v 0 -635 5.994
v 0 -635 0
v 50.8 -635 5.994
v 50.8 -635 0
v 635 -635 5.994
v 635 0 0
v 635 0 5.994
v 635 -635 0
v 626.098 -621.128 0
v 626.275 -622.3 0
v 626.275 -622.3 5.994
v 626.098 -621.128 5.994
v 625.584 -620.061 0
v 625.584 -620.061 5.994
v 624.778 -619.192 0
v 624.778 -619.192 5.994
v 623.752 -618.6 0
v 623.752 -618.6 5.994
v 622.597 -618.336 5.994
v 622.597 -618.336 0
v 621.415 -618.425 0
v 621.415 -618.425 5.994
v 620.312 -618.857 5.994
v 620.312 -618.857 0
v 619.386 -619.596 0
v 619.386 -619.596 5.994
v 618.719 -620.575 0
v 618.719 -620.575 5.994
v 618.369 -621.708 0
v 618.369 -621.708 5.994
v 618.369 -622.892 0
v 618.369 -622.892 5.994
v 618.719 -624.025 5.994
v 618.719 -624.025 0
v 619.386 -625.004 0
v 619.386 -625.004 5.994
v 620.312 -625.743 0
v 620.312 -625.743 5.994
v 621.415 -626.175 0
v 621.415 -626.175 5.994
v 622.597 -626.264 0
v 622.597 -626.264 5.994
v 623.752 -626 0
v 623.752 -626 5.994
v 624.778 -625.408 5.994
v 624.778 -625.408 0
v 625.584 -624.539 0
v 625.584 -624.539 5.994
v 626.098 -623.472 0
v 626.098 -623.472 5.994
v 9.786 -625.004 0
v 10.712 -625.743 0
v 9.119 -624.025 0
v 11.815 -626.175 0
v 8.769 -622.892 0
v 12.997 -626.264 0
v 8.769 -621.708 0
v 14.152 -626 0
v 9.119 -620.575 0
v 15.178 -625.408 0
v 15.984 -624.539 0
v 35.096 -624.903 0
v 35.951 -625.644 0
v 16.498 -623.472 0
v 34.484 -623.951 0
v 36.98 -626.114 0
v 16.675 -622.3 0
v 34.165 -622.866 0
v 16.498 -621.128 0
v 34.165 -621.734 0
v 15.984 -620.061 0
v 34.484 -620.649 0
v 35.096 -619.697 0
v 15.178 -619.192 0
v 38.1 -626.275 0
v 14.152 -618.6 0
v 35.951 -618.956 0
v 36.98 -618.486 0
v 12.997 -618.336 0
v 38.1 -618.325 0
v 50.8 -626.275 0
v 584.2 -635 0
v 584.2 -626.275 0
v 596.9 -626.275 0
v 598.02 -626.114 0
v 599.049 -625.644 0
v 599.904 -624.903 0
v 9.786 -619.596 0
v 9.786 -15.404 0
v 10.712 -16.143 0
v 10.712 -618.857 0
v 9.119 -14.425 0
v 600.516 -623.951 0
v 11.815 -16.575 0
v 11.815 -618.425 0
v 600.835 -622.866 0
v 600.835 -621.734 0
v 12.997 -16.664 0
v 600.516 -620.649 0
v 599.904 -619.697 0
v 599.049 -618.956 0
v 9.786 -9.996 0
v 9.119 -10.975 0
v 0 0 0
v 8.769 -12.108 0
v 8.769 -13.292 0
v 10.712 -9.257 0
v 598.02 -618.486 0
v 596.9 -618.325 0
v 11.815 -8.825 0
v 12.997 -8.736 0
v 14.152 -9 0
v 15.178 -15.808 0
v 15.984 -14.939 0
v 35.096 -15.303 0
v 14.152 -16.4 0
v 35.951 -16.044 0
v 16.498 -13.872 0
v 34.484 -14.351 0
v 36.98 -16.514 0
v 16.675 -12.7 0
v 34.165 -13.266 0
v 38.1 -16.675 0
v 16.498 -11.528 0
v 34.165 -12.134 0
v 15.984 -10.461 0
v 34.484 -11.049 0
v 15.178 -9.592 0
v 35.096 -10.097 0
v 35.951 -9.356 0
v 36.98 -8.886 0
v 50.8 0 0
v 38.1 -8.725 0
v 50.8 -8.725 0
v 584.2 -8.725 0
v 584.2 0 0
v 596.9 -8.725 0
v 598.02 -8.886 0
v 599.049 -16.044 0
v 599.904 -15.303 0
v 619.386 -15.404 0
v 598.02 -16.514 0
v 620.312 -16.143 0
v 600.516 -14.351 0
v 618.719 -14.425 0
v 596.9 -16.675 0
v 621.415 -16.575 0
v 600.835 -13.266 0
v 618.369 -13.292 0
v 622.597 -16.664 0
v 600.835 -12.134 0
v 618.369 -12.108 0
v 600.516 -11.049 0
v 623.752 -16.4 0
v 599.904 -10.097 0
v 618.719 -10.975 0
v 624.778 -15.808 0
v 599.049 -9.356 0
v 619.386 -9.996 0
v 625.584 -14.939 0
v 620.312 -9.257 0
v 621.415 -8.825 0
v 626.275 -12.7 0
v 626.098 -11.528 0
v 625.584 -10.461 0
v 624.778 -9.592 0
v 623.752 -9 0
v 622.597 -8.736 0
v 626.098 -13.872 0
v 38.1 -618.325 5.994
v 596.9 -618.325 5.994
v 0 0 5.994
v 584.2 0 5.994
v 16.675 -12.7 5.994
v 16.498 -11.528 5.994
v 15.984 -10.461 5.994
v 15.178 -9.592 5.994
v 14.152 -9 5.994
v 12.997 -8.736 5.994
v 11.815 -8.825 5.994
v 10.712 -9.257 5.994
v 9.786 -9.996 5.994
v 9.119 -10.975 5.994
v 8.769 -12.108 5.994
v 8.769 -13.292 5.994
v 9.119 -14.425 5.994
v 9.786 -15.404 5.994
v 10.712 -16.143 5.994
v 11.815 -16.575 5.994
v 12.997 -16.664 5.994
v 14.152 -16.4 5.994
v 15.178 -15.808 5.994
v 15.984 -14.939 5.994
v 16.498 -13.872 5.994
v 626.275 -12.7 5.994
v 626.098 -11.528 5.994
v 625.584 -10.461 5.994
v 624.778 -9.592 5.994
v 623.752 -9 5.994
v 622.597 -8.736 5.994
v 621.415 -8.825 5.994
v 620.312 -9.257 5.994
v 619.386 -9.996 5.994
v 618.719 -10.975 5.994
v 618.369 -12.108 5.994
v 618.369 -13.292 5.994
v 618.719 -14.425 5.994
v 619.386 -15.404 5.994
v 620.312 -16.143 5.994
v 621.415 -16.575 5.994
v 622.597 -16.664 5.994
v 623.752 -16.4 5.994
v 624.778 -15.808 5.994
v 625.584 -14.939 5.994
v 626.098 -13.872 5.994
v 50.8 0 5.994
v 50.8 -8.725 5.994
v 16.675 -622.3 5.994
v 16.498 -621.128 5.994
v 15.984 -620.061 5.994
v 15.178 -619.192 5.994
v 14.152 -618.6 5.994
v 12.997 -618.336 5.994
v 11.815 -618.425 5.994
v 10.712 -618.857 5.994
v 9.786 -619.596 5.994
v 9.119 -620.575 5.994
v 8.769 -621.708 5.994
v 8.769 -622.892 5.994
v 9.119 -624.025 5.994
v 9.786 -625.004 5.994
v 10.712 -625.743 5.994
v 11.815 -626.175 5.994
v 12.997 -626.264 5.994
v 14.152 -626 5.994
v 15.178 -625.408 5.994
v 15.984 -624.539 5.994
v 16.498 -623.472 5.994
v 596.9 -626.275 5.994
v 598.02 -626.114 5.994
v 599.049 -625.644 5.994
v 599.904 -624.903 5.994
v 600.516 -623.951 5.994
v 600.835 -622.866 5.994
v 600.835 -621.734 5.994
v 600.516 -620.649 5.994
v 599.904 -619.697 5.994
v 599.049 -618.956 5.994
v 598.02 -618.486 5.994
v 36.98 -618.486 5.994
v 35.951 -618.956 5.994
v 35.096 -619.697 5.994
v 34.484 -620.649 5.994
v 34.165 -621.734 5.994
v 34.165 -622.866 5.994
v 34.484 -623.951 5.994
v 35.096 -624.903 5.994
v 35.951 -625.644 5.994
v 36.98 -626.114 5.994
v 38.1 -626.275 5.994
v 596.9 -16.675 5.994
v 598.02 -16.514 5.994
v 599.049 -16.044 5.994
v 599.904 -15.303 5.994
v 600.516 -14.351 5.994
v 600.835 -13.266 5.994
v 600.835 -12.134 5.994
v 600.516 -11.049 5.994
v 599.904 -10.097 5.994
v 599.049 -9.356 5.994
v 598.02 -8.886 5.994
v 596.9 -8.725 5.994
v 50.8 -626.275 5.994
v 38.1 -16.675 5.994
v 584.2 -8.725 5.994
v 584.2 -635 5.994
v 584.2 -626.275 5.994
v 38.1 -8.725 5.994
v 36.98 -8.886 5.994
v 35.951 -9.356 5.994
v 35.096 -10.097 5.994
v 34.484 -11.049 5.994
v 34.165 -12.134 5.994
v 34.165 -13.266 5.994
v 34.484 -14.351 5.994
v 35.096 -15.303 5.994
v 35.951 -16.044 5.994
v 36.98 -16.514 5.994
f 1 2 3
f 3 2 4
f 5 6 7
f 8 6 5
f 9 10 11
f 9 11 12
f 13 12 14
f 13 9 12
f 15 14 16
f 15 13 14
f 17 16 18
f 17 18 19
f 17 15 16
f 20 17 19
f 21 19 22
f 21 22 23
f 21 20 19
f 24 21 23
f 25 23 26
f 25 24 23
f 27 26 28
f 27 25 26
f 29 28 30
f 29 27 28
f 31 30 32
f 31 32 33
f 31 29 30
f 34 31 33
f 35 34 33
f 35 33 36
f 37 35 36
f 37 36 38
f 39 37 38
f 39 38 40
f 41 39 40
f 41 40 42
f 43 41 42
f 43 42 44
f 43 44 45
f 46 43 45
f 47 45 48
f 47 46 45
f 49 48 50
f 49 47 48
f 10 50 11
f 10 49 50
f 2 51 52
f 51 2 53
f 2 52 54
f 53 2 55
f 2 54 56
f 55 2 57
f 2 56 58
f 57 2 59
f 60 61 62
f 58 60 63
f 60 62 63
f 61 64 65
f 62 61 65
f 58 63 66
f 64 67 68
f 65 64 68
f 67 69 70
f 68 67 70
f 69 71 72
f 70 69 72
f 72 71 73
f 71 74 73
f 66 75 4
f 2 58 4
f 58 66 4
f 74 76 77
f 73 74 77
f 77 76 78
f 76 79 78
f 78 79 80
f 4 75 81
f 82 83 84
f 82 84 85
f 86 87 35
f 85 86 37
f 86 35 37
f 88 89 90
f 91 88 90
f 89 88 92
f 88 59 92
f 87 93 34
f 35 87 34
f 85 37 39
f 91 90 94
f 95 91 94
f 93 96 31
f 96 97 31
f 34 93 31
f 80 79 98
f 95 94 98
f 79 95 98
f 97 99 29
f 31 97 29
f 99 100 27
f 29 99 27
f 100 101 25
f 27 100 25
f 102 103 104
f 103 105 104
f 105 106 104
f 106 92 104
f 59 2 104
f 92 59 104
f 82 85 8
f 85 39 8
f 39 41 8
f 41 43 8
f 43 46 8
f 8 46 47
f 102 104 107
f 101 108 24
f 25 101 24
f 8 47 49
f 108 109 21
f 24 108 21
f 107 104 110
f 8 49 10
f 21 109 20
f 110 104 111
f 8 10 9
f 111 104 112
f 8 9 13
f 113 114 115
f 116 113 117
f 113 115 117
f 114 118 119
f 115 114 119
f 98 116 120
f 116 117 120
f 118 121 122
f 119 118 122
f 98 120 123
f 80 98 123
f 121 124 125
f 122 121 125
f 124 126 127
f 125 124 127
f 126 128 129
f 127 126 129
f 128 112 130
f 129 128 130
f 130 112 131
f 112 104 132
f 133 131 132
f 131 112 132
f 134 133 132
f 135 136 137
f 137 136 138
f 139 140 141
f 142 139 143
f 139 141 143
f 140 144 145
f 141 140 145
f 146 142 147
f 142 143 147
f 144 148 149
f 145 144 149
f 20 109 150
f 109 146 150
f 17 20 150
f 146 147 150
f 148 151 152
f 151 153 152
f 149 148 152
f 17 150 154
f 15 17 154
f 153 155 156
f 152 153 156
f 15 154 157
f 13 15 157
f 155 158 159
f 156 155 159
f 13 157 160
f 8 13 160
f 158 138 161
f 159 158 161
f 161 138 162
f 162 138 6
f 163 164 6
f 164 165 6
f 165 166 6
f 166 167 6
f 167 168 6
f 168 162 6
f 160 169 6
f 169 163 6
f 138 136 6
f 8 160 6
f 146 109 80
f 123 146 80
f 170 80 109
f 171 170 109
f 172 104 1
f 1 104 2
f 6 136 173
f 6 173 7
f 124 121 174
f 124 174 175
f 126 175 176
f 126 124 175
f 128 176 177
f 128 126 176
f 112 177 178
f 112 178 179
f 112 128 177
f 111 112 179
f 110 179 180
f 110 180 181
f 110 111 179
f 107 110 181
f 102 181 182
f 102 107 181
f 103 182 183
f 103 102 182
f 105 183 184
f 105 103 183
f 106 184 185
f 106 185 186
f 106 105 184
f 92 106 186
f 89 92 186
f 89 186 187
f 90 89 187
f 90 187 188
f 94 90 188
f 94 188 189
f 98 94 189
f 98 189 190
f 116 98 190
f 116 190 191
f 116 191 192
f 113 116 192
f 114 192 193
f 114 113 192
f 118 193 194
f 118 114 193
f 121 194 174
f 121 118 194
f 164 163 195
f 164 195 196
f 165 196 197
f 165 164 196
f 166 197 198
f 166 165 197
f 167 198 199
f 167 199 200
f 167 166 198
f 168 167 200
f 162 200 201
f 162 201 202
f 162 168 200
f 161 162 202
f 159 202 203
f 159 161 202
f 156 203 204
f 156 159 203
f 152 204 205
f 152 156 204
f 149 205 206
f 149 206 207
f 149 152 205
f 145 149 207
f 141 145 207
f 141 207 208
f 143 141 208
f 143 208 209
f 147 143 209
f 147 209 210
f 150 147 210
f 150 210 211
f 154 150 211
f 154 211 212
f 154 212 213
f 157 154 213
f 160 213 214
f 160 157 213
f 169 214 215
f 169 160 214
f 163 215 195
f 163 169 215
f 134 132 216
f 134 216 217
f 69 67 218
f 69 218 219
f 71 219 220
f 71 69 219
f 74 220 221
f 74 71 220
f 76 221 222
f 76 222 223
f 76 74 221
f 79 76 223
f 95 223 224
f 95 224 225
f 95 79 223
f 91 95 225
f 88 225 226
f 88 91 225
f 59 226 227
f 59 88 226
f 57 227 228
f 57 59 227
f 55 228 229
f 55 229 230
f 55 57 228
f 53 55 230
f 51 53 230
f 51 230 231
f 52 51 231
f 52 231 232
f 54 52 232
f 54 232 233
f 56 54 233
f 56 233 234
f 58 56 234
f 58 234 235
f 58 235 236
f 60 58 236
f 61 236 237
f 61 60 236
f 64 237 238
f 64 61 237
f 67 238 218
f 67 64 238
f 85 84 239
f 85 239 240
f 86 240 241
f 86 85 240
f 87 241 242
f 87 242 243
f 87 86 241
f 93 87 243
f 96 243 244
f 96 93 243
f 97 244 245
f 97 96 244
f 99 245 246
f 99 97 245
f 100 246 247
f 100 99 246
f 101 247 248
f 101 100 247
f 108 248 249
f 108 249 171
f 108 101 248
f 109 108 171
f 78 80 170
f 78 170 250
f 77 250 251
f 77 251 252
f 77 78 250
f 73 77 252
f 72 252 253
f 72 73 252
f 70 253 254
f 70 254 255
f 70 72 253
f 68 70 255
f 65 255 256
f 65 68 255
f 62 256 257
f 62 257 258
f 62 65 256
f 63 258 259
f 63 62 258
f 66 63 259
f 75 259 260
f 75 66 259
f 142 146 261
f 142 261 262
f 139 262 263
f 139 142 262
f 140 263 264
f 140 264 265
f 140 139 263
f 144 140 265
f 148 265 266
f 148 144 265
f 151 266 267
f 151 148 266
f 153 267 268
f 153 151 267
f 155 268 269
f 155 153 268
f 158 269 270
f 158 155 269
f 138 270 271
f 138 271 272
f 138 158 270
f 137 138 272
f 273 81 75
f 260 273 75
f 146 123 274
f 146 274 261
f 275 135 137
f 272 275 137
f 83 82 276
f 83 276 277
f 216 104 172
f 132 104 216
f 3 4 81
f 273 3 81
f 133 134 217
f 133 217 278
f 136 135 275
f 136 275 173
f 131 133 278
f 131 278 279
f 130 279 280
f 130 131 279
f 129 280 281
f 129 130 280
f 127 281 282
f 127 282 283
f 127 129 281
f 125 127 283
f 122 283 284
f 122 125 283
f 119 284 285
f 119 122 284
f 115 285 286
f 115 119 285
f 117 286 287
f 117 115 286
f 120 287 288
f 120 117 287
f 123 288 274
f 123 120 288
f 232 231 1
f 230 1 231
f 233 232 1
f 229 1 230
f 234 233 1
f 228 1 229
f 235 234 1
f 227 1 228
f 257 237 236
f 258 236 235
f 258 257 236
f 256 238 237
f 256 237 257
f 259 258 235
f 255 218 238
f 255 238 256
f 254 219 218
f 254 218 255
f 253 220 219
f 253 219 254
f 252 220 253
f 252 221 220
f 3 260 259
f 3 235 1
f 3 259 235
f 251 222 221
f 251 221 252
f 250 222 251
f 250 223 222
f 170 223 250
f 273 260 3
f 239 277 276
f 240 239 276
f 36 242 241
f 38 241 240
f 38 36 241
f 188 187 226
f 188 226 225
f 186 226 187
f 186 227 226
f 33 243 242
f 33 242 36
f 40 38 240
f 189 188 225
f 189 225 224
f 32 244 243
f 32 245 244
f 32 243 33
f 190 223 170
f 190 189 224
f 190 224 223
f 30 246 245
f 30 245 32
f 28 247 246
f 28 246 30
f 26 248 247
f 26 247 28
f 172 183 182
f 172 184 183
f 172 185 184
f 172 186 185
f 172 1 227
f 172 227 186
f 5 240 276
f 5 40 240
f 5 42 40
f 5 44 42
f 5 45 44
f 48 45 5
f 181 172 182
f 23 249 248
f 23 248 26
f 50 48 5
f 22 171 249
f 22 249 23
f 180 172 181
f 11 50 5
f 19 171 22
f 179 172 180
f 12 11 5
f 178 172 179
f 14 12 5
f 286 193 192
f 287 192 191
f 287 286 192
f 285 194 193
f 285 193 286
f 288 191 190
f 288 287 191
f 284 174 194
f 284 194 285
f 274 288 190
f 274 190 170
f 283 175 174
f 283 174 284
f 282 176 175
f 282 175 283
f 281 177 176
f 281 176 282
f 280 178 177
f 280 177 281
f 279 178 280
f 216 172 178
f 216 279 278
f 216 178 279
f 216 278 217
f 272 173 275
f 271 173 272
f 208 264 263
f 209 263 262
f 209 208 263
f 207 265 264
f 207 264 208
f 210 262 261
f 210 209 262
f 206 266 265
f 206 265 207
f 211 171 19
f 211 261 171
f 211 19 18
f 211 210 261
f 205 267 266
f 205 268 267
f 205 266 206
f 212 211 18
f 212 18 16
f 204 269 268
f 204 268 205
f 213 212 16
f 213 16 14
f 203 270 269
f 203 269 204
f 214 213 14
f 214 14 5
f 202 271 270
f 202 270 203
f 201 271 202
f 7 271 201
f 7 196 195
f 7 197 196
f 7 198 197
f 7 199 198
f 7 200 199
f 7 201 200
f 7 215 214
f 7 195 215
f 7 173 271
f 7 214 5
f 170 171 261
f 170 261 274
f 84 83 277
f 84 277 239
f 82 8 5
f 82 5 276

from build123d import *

# Parameters (mm, degrees)
SKETCH_R      = 3.9751
EXTRUDE_DEPTH = 5.9944


with BuildPart() as part:
    # Sketch → Extrude (new body)
    with BuildSketch(Plane.XY):
        with BuildLine():
            Line((0, 0), (0, -635))
            Line((0, -635), (50.8, -635))
            Line((50.8, -635), (50.8, -626.2751))
            Line((50.8, -626.2751), (38.1, -626.2751))
            ThreePointArc((38.1, -618.3249), (34.1249, -622.3), (38.1, -626.2751))
            Line((38.1, -618.3249), (596.9, -618.3249))
            ThreePointArc((596.9, -626.2751), (600.8751, -622.3), (596.9, -618.3249))
            Line((584.2, -626.2751), (596.9, -626.2751))
            Line((584.2, -635), (584.2, -626.2751))
            Line((635, -635), (584.2, -635))
            Line((635, 0), (635, -635))
            Line((584.2, 0), (635, 0))
            Line((584.2, -8.7249), (584.2, 0))
            Line((584.2, -8.7249), (596.9, -8.7249))
            ThreePointArc((596.9, -16.6751), (600.8751, -12.7), (596.9, -8.7249))
            Line((38.1, -16.6751), (596.9, -16.6751))
            ThreePointArc((38.1, -8.7249), (34.1249, -12.7), (38.1, -16.6751))
            Line((50.8, -8.7249), (38.1, -8.7249))
            Line((50.8, 0), (50.8, -8.7249))
            Line((0, 0), (50.8, 0))
        make_face()
        with Locations((12.7, -12.7)):
            Circle(SKETCH_R, mode=Mode.SUBTRACT)
        with Locations((12.7, -622.3)):
            Circle(SKETCH_R, mode=Mode.SUBTRACT)
        with Locations((622.3, -12.7)):
            Circle(SKETCH_R, mode=Mode.SUBTRACT)
        with Locations((622.3, -622.3)):
            Circle(SKETCH_R, mode=Mode.SUBTRACT)
    extrude(amount=EXTRUDE_DEPTH)


solid = part.part
